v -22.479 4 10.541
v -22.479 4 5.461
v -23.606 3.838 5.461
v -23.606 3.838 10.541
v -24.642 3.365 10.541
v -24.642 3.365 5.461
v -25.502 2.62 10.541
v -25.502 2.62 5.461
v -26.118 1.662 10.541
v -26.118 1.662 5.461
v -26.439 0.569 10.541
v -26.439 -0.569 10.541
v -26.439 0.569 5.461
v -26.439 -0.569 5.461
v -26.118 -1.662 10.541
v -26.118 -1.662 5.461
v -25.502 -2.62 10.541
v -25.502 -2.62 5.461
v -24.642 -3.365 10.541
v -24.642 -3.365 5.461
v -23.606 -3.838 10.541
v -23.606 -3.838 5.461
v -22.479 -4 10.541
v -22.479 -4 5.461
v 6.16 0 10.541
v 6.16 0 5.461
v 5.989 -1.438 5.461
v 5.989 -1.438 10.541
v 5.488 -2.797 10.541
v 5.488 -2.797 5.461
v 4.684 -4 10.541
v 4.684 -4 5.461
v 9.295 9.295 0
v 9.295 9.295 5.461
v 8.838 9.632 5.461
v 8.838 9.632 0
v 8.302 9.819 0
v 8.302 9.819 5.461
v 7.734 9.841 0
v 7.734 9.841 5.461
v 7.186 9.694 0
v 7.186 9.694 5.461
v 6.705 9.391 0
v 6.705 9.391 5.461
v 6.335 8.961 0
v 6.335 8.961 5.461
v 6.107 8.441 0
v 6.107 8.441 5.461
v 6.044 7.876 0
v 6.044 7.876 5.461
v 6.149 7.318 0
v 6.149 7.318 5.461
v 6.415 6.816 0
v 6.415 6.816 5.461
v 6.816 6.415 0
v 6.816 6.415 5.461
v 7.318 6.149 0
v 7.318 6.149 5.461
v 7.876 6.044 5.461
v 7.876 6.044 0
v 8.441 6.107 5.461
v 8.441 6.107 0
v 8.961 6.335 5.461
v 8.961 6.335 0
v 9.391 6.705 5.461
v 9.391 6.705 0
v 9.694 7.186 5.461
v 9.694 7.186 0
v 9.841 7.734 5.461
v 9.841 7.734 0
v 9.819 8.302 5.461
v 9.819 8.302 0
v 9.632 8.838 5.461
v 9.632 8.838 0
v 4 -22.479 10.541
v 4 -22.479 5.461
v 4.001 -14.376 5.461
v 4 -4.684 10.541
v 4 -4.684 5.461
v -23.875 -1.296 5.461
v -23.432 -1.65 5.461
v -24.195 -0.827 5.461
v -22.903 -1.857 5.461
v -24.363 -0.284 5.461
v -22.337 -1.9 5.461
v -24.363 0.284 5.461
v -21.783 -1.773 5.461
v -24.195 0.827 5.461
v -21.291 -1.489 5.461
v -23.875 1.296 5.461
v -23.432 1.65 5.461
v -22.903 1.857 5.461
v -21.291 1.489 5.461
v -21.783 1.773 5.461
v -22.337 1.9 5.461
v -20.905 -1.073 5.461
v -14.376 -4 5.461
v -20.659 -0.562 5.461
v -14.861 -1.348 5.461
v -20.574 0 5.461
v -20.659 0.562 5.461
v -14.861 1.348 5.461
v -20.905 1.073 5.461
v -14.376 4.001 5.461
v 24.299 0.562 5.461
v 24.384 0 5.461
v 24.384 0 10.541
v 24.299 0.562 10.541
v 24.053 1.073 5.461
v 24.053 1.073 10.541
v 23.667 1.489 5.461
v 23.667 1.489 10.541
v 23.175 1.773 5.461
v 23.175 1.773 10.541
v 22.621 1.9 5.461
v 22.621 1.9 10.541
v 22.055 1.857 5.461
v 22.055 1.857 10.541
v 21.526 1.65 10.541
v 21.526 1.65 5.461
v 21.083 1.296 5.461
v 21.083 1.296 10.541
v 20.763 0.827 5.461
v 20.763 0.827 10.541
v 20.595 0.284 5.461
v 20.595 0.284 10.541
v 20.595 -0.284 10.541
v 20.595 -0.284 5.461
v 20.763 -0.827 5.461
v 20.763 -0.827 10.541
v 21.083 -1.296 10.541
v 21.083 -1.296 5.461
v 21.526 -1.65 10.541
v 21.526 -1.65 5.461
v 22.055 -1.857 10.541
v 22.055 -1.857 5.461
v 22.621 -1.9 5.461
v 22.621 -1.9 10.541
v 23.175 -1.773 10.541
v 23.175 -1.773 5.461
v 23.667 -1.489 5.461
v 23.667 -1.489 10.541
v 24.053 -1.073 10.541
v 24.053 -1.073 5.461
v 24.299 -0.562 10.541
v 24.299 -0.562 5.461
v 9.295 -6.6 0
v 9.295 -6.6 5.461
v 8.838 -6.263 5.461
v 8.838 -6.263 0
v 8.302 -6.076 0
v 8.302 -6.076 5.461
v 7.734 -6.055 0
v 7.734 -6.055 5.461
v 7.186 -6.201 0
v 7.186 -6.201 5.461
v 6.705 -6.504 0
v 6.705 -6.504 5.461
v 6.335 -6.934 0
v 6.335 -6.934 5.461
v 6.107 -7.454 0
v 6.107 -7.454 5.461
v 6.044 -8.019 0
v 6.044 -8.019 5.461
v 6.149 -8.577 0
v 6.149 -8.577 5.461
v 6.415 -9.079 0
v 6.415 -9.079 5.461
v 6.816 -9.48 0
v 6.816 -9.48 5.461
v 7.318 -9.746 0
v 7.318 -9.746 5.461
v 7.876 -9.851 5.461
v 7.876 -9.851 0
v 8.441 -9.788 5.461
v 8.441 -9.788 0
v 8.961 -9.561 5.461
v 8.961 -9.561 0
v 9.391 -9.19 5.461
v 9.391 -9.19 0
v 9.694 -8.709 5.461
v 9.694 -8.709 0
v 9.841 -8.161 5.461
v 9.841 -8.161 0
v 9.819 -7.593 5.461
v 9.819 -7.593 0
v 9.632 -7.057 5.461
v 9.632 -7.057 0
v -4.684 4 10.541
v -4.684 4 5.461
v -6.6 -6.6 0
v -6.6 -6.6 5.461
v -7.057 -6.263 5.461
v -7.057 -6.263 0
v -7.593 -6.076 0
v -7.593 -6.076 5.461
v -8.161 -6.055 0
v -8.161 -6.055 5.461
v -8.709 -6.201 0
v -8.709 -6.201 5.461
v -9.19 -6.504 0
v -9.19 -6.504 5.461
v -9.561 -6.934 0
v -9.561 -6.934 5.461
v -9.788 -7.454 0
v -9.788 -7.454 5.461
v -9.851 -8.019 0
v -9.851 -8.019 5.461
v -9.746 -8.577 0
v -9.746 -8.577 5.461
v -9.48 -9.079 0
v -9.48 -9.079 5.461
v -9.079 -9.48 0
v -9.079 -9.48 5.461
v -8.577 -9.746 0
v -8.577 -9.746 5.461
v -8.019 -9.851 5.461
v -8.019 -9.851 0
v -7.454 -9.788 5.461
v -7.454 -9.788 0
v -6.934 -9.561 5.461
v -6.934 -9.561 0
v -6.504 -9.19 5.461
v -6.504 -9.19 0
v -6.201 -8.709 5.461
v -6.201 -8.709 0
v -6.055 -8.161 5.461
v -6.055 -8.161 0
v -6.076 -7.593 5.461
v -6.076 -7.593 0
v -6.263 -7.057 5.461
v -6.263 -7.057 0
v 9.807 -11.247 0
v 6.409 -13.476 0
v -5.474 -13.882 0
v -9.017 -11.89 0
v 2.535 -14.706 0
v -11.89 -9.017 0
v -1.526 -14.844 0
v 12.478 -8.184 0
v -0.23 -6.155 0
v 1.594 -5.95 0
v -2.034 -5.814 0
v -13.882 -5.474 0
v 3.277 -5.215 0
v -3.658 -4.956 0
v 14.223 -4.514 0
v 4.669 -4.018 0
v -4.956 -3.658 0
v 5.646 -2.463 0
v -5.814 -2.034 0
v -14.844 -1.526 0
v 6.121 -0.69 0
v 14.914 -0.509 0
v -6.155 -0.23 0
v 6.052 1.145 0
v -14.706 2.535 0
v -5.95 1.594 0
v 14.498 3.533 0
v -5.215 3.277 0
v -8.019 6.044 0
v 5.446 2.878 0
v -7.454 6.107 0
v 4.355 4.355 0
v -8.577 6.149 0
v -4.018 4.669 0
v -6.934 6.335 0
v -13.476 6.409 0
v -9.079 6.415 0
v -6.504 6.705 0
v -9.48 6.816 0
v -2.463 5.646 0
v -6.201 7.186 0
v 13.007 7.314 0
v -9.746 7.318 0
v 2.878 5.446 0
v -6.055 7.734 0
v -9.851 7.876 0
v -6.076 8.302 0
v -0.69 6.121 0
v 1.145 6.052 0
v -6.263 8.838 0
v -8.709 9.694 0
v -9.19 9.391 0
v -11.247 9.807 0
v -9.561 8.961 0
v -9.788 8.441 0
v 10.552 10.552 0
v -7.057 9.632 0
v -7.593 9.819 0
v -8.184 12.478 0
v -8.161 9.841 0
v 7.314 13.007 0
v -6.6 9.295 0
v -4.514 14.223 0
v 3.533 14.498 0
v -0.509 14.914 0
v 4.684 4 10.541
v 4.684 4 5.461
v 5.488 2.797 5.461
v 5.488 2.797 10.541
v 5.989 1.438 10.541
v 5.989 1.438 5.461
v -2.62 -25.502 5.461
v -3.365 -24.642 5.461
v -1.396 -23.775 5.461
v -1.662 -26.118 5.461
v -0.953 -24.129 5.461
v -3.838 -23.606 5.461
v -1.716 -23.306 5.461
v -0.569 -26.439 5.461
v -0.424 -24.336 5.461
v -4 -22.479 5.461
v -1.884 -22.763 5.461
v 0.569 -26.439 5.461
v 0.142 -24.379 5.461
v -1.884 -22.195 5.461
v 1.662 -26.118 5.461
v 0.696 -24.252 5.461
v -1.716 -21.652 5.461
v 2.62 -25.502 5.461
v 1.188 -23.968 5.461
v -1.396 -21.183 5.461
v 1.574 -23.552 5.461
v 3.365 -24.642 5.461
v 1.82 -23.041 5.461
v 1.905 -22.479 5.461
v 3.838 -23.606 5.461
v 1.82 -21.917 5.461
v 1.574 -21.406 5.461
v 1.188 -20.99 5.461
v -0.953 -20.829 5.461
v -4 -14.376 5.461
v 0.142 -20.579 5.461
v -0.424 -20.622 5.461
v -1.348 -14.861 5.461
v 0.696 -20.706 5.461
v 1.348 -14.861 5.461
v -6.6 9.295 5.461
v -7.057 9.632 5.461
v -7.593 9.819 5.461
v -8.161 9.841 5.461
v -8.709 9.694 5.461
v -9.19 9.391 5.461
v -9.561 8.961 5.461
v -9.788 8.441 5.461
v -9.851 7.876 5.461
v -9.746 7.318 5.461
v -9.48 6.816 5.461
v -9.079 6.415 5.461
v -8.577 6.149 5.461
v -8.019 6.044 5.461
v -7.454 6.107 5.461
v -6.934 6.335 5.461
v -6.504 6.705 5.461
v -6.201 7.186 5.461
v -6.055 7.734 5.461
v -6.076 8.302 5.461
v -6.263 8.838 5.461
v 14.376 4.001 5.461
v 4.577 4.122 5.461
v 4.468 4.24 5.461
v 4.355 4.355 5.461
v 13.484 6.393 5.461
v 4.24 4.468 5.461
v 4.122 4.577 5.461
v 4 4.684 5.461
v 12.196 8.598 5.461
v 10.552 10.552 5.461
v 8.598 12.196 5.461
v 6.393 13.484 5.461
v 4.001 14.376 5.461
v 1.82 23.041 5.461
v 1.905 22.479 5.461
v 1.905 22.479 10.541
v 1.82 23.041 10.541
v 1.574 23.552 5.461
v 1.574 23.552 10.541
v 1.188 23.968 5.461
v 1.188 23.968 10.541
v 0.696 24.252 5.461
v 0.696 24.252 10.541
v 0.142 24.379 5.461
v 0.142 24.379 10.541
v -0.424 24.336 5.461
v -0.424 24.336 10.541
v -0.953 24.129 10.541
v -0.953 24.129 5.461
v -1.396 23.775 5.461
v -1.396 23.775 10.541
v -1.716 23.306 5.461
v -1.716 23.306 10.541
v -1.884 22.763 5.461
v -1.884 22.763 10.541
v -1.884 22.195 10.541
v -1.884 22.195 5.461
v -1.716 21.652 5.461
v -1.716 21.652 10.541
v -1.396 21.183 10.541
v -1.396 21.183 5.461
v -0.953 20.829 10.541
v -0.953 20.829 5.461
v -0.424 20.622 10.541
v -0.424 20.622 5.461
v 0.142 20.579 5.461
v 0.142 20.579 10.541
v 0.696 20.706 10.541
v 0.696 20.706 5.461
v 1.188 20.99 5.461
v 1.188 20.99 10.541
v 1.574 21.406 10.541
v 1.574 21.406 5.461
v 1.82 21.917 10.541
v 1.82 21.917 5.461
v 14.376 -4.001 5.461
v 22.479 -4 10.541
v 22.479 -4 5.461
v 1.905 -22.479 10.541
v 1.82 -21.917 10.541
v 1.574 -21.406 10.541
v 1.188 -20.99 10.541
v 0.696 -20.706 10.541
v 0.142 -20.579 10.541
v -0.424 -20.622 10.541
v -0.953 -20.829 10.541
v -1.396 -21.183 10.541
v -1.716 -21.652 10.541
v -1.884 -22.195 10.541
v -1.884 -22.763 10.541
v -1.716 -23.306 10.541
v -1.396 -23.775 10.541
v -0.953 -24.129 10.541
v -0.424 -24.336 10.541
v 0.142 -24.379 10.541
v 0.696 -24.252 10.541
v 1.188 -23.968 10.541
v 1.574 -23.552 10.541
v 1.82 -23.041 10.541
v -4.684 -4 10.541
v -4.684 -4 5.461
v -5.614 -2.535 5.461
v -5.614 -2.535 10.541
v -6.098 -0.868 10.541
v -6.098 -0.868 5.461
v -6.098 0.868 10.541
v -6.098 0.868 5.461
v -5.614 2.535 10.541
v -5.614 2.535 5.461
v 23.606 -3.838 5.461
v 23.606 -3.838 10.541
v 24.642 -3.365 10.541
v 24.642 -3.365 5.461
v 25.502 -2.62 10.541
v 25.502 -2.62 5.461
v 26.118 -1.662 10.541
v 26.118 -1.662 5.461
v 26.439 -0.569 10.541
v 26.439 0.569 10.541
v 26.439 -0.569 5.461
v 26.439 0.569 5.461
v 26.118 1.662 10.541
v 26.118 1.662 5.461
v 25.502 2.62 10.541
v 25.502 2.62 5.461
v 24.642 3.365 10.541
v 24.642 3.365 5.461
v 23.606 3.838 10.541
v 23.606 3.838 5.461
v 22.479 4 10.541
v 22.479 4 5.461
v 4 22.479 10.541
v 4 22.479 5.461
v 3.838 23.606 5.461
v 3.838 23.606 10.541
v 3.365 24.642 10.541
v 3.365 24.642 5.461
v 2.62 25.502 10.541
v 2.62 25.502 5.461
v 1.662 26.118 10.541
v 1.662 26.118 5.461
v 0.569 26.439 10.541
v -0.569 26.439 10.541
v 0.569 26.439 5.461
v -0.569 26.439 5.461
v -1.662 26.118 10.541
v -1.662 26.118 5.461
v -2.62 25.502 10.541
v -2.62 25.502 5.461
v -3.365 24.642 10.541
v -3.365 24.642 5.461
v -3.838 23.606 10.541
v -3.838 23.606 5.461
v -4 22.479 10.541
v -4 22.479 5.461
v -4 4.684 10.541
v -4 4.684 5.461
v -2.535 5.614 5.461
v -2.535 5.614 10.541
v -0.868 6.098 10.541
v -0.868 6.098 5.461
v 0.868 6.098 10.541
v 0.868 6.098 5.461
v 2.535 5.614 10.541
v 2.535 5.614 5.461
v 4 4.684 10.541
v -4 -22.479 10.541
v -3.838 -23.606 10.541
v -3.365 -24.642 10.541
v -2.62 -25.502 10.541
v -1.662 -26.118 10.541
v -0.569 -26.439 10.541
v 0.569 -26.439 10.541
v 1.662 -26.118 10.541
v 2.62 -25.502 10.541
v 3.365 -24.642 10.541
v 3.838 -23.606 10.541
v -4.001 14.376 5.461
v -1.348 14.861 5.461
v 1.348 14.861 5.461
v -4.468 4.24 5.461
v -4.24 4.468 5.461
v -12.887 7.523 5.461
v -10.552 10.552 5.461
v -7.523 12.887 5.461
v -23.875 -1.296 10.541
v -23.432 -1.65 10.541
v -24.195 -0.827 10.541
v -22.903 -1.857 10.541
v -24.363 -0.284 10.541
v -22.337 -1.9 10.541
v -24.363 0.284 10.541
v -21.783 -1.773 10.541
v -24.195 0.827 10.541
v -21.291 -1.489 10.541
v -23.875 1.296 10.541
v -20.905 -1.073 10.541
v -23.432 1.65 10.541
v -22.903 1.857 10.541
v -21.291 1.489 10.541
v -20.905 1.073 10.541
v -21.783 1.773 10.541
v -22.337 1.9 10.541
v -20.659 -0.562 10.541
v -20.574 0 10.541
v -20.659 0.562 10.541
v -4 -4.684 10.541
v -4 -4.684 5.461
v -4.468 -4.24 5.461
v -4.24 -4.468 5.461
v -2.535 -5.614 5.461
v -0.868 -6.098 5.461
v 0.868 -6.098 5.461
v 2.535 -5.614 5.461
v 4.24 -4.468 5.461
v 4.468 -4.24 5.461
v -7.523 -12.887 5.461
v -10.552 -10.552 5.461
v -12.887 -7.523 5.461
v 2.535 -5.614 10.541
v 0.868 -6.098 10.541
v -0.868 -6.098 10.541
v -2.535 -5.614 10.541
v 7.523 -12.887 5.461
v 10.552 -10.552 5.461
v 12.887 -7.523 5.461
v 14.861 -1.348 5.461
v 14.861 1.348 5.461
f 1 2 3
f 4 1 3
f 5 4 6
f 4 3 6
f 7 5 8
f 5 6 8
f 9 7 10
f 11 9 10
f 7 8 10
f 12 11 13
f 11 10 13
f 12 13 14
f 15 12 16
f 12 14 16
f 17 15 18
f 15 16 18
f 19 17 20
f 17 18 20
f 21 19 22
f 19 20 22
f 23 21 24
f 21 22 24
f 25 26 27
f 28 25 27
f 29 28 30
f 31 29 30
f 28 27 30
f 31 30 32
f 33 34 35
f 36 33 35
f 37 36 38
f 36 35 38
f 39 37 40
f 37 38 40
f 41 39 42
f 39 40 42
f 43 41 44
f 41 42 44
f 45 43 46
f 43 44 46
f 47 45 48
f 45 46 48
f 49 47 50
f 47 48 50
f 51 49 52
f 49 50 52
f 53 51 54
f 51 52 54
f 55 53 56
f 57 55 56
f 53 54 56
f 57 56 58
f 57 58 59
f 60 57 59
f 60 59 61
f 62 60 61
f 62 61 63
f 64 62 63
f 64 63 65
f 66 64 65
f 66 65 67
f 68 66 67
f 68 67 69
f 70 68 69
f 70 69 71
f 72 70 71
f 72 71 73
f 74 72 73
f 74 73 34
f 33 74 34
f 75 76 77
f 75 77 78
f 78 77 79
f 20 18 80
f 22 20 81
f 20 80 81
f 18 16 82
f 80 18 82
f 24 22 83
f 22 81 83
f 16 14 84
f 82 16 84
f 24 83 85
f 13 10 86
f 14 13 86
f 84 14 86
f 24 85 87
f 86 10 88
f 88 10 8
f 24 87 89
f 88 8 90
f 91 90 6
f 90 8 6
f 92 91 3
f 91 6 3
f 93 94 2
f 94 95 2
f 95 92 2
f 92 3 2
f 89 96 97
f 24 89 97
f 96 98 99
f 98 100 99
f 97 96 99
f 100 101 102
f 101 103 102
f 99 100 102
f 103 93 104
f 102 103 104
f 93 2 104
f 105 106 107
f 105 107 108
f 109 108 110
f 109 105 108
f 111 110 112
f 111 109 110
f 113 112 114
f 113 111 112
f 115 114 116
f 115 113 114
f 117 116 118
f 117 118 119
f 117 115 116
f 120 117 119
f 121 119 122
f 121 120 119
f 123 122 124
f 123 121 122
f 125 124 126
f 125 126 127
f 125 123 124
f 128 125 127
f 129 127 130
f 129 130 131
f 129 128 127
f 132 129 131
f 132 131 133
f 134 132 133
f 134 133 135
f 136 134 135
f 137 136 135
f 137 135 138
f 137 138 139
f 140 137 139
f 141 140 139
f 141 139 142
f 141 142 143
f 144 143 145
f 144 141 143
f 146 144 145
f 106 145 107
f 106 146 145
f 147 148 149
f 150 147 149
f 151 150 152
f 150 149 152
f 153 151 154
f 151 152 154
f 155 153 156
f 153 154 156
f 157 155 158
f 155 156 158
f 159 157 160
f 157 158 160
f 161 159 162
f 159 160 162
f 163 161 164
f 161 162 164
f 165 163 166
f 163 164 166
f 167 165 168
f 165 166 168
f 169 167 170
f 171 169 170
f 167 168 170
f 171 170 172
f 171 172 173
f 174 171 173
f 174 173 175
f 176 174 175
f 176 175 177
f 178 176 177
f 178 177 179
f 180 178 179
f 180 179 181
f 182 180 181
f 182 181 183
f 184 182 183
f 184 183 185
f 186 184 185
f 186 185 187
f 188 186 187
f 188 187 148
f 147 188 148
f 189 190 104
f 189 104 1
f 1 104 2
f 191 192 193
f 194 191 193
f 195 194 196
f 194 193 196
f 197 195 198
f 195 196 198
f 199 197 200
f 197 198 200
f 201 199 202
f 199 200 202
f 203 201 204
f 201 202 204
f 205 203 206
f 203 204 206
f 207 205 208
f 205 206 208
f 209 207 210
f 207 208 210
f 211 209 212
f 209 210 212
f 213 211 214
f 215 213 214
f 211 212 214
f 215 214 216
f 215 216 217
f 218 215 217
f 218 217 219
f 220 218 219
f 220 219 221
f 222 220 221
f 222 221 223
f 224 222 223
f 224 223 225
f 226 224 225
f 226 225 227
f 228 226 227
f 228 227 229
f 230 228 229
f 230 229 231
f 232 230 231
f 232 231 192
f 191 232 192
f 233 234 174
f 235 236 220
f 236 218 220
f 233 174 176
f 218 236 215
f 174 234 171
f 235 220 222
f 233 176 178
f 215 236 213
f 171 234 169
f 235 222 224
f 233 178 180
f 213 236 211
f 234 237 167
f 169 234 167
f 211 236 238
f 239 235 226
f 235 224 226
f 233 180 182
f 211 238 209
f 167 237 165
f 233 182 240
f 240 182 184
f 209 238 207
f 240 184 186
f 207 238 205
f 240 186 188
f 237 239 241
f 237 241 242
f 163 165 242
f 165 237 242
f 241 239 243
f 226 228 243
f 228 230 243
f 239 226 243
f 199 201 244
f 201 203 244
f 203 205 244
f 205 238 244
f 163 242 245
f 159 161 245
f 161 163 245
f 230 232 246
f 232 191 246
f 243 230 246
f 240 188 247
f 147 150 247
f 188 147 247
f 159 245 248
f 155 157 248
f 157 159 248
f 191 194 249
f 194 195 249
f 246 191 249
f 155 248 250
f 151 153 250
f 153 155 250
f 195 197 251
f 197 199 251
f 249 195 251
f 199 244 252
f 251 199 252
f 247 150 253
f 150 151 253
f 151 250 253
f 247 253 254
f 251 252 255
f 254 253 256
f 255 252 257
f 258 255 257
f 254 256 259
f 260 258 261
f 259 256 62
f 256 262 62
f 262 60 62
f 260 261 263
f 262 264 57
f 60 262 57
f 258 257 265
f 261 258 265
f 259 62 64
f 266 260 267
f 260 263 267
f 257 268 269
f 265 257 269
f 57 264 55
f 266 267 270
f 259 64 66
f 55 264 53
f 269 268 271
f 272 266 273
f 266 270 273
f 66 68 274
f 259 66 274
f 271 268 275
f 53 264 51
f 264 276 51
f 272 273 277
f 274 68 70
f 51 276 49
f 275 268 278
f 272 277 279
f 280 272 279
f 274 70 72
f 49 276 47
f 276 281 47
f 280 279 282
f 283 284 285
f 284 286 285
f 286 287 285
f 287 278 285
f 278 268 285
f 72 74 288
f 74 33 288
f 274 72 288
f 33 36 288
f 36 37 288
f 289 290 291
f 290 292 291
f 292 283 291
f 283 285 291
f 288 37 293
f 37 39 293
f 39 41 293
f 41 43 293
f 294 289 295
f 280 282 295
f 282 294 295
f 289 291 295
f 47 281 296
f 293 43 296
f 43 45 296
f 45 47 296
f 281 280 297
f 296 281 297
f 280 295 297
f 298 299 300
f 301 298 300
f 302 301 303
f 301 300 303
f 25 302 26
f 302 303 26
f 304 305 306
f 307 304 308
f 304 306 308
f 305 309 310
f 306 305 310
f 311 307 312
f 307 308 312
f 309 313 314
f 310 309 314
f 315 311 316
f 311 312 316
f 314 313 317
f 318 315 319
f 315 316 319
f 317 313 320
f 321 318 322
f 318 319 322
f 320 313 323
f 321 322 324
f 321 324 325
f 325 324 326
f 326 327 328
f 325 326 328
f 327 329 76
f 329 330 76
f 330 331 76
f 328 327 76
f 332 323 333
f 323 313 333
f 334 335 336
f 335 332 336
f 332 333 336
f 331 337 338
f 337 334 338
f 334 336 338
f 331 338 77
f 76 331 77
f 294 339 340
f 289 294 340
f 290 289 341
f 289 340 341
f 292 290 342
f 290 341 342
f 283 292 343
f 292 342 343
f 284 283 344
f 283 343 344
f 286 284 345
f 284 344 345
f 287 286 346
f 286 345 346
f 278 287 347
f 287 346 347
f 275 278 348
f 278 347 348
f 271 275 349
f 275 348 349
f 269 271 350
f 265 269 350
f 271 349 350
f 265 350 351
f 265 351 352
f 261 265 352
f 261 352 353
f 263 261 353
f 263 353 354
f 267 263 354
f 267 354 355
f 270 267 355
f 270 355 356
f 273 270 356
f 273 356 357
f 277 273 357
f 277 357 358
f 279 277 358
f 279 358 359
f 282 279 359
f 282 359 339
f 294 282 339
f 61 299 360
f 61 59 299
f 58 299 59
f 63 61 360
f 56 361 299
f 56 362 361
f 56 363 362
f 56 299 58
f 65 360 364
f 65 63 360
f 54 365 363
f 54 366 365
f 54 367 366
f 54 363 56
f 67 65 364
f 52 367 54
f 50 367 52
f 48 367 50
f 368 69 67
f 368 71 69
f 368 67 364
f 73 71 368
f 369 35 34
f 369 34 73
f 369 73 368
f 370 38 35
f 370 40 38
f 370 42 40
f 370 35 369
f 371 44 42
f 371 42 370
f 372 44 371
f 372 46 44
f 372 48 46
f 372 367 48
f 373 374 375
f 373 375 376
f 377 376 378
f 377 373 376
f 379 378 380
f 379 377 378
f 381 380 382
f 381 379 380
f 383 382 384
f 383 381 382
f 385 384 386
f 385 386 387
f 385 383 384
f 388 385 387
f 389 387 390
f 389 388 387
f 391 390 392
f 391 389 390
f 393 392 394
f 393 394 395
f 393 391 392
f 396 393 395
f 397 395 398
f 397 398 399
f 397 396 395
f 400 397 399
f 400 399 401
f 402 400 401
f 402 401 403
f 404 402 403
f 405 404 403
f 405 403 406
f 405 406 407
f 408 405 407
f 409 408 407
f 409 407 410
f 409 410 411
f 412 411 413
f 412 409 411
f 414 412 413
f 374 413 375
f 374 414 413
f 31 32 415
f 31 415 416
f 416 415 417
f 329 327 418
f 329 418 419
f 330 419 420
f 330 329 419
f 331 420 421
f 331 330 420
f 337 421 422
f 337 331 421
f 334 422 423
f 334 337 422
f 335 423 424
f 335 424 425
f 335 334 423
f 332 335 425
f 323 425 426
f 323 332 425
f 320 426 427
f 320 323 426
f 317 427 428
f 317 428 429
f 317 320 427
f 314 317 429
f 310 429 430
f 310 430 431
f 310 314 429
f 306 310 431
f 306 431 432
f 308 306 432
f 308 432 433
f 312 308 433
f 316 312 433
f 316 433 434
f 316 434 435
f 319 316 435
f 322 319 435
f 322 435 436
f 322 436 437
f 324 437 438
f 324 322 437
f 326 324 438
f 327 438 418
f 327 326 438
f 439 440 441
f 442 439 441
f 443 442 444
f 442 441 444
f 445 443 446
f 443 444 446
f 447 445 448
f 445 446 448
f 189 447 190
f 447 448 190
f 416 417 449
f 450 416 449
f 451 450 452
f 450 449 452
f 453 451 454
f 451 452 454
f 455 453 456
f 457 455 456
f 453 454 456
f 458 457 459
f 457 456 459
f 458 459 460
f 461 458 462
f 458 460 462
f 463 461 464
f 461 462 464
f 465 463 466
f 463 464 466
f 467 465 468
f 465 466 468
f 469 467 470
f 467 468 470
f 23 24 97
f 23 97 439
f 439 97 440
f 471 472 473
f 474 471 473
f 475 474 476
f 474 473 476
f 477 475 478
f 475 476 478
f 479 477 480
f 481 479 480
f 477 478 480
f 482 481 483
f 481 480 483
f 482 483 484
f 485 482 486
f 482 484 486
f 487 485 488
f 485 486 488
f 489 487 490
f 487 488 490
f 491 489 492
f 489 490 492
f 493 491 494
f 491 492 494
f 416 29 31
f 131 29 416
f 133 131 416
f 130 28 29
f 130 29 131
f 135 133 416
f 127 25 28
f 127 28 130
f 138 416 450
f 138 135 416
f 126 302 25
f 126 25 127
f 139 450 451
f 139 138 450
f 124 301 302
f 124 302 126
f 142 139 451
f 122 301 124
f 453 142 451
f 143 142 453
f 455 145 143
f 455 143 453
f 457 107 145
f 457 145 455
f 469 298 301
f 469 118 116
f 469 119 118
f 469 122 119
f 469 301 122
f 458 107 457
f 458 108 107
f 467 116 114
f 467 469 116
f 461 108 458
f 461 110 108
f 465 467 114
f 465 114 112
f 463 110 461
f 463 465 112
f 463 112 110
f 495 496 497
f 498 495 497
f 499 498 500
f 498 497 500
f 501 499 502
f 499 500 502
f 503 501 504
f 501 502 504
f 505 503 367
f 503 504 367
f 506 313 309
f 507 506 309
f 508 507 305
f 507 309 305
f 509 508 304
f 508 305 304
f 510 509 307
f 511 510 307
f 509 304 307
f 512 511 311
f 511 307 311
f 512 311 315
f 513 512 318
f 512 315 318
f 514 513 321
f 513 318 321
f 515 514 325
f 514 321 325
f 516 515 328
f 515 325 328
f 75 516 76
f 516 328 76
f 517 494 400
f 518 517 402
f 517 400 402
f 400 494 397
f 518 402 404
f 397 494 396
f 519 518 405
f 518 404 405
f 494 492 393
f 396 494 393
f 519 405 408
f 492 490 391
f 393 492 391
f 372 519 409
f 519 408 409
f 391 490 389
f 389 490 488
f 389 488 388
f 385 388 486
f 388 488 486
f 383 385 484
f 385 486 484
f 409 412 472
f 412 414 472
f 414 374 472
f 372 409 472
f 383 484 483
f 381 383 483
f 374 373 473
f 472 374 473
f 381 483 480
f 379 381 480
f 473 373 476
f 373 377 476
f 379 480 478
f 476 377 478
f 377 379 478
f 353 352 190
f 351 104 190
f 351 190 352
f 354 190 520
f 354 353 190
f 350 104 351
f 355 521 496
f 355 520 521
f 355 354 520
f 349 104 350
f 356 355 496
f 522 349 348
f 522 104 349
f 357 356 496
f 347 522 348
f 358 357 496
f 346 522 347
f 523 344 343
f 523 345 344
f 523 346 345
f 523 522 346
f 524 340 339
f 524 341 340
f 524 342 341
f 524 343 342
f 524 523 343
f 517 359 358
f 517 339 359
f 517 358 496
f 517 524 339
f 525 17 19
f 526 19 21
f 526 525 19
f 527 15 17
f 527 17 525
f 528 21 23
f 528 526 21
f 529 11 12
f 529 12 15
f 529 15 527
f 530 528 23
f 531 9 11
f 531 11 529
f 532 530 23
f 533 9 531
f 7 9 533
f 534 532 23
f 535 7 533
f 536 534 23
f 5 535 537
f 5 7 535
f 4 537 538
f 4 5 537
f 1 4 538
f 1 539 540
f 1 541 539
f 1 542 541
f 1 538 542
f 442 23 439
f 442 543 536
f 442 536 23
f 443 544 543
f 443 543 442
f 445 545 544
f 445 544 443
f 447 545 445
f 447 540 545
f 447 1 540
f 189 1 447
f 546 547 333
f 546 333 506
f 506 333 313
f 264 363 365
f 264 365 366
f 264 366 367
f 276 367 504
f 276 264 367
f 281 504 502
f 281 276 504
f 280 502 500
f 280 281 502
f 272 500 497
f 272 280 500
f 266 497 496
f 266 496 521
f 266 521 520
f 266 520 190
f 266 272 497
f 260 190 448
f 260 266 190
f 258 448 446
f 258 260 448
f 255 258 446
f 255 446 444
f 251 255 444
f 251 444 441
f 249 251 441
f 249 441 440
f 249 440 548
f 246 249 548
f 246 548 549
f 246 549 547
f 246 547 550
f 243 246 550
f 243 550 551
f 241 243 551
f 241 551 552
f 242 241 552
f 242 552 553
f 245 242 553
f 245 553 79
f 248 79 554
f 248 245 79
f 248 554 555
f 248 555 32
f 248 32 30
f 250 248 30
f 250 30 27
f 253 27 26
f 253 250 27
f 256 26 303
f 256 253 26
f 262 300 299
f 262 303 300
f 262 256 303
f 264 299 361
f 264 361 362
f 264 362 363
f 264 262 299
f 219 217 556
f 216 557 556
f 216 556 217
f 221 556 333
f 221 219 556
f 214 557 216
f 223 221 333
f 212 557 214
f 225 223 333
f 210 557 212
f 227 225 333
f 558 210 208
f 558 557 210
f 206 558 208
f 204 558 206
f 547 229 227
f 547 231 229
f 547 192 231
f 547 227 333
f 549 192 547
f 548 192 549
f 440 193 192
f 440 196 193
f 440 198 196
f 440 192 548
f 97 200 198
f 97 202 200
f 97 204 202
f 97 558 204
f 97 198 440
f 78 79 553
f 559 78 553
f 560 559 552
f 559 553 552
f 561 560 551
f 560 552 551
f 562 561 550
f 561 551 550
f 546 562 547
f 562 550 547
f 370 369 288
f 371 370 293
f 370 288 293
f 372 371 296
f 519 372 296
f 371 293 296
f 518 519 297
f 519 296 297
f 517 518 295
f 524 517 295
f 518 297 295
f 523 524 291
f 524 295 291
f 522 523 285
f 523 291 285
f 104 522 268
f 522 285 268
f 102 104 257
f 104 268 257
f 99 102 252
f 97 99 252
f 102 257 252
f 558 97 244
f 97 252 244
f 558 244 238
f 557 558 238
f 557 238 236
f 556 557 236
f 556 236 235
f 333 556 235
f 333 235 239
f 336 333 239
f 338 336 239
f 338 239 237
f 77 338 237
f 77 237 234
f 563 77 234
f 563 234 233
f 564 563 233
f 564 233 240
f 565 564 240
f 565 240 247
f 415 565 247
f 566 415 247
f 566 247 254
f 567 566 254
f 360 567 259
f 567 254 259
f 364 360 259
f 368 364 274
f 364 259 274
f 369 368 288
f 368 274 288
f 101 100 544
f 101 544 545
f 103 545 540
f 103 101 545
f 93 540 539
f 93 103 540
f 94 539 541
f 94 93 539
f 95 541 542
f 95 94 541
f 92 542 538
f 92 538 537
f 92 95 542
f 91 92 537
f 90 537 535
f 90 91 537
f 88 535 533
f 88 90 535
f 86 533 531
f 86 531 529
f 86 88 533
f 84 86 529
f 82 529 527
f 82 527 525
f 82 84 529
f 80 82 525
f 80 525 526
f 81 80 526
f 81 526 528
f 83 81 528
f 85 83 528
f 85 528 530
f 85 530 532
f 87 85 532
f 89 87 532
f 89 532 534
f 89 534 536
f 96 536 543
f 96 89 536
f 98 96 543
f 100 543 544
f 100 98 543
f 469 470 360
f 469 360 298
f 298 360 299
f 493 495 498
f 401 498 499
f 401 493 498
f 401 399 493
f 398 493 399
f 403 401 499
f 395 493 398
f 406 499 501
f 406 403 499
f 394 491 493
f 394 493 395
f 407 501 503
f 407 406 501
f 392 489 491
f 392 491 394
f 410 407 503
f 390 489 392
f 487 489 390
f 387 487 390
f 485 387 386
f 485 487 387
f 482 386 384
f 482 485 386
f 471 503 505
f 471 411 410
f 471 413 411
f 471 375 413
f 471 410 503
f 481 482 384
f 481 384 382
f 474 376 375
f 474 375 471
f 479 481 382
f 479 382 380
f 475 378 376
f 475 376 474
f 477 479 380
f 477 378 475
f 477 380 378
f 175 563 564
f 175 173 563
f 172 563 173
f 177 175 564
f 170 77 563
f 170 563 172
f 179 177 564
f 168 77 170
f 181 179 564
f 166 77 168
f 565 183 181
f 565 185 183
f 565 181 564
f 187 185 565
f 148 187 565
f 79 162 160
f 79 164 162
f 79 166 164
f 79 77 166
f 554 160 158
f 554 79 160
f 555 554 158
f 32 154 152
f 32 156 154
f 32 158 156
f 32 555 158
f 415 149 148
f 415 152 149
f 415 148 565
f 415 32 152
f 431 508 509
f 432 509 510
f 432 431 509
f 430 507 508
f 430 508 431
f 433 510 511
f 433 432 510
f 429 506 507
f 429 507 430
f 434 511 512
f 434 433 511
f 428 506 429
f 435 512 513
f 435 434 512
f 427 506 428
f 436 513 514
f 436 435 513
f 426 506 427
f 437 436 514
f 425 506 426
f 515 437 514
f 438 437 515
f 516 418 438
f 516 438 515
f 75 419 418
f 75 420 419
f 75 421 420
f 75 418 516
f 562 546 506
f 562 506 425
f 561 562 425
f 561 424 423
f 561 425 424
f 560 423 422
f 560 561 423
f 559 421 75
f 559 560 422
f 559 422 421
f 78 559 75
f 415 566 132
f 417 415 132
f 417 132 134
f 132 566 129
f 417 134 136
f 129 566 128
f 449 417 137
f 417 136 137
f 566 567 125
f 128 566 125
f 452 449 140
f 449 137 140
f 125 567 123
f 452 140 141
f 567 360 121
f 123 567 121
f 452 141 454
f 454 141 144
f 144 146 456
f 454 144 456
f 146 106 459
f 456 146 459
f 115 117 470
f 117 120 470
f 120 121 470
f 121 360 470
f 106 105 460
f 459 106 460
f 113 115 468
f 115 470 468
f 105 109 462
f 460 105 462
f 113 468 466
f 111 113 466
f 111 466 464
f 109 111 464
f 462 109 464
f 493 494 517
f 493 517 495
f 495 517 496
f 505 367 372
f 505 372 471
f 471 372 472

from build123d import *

# Parameters (mm, degrees)
F0_R     = 14.9225
F0_R_2   = 6.1595
F1_DEPTH = 5.461
F2_R     = 1.905
F3_DEPTH = 25.4
F5_ANGLE = 45
F6_R     = 1.905
F7_DEPTH = 5.08


with BuildPart() as f1:
    # F0 (on Top) → F1 (new body)
    with BuildSketch(Plane.XY):
        Circle(F0_R)
        Circle(F0_R_2, mode=Mode.SUBTRACT)
    extrude(amount=F1_DEPTH)

    # F2 (on face) → F3 (cut)
    with BuildSketch(Plane.XY.offset(5.461)):
        with Locations((-11.2395, 0)):
            Circle(F2_R)
        with Locations((0, 11.2395)):
            Circle(F2_R)
        with Locations((11.2395, 0)):
            Circle(F2_R)
        with Locations((0, -11.2395)):
            Circle(F2_R)
    extrude(amount=-F3_DEPTH, mode=Mode.SUBTRACT)


with BuildPart() as f1_1:
    # F5: moved
    add(f1.part.rotate(Axis((0, 0, 9.9508911371), (0, 0, 1)), F5_ANGLE))

    # F6 (on face) → F7 (join)
    with BuildSketch(Plane.XY.offset(5.461)):
        with BuildLine():
            ThreePointArc((-14.3762653704, -4.0005), (-14.9225, 0), (-14.3762653704, 4.0005))
            Line((-14.3762653704, 4.0005), (-22.479, 4.0005))
            ThreePointArc((-22.479, 4.0005), (-26.4795, 0), (-22.479, -4.0005))
            Line((-22.479, -4.0005), (-14.3762653704, -4.0005))
        make_face()
        with Locations((-22.479, 0)):
            Circle(F6_R, mode=Mode.SUBTRACT)
        with BuildLine():
            Line((-4.6835285843, 4.0005), (-14.3762653704, 4.0005))
            ThreePointArc((-14.3762653704, 4.0005), (-14.9225, 0), (-14.3762653704, -4.0005))
            Line((-14.3762653704, -4.0005), (-4.6835285843, -4.0005))
            ThreePointArc((-4.6835285843, -4.0005), (-6.1595, 0), (-4.6835285843, 4.0005))
        make_face()
        with BuildLine():
            ThreePointArc((14.9225, 0), (14.7853107211, 2.0188098301), (14.3762653704, 4.0005))
            Line((14.3762653704, 4.0005), (4.6835285843, 4.0005))
            ThreePointArc((4.6835285843, 4.0005), (5.7787383816, 2.1320466617), (6.1595, 0))
            ThreePointArc((6.1595, 0), (5.7787383816, -2.1320466617), (4.6835285843, -4.0005))
            Line((4.6835285843, -4.0005), (14.3762653704, -4.0005))
            ThreePointArc((14.3762653704, -4.0005), (14.7853107211, -2.0188098301), (14.9225, 0))
        make_face()
        with BuildLine():
            Line((22.479, 4.0005), (14.3762653704, 4.0005))
            ThreePointArc((14.3762653704, 4.0005), (14.7853107211, 2.0188098301), (14.9225, 0))
            ThreePointArc((14.9225, 0), (14.7853107211, -2.0188098301), (14.3762653704, -4.0005))
            Line((14.3762653704, -4.0005), (22.479, -4.0005))
            ThreePointArc((22.479, -4.0005), (26.4795, 0), (22.479, 4.0005))
        make_face()
        with Locations((22.479, 0)):
            Circle(F6_R, mode=Mode.SUBTRACT)
        with BuildLine():
            Line((4.0005, 14.3762653704), (4.0005, 22.479))
            ThreePointArc((4.0005, 22.479), (0, 26.4795), (-4.0005, 22.479))
            Line((-4.0005, 22.479), (-4.0005, 14.3762653704))
            ThreePointArc((-4.0005, 14.3762653704), (0, 14.9225), (4.0005, 14.3762653704))
        make_face()
        with Locations((0, 22.479)):
            Circle(F6_R, mode=Mode.SUBTRACT)
        with BuildLine():
            Line((4.0005, 4.6835285843), (4.0005, 14.3762653704))
            ThreePointArc((4.0005, 14.3762653704), (0, 14.9225), (-4.0005, 14.3762653704))
            Line((-4.0005, 14.3762653704), (-4.0005, 4.6835285843))
            ThreePointArc((-4.0005, 4.6835285843), (0, 6.1595), (4.0005, 4.6835285843))
        make_face()
        with BuildLine():
            ThreePointArc((4.0005, -14.3762653704), (0, -14.9225), (-4.0005, -14.3762653704))
            Line((-4.0005, -14.3762653704), (-4.0005, -22.479))
            ThreePointArc((-4.0005, -22.479), (0, -26.4795), (4.0005, -22.479))
            Line((4.0005, -22.479), (4.0005, -14.3762653704))
        make_face()
        with Locations((0, -22.479)):
            Circle(F6_R, mode=Mode.SUBTRACT)
        with BuildLine():
            Line((-4.0005, -4.6835285843), (-4.0005, -14.3762653704))
            ThreePointArc((-4.0005, -14.3762653704), (0, -14.9225), (4.0005, -14.3762653704))
            Line((4.0005, -14.3762653704), (4.0005, -4.6835285843))
            ThreePointArc((4.0005, -4.6835285843), (0, -6.1595), (-4.0005, -4.6835285843))
        make_face()
    extrude(amount=F7_DEPTH)


solid = f1_1.part
